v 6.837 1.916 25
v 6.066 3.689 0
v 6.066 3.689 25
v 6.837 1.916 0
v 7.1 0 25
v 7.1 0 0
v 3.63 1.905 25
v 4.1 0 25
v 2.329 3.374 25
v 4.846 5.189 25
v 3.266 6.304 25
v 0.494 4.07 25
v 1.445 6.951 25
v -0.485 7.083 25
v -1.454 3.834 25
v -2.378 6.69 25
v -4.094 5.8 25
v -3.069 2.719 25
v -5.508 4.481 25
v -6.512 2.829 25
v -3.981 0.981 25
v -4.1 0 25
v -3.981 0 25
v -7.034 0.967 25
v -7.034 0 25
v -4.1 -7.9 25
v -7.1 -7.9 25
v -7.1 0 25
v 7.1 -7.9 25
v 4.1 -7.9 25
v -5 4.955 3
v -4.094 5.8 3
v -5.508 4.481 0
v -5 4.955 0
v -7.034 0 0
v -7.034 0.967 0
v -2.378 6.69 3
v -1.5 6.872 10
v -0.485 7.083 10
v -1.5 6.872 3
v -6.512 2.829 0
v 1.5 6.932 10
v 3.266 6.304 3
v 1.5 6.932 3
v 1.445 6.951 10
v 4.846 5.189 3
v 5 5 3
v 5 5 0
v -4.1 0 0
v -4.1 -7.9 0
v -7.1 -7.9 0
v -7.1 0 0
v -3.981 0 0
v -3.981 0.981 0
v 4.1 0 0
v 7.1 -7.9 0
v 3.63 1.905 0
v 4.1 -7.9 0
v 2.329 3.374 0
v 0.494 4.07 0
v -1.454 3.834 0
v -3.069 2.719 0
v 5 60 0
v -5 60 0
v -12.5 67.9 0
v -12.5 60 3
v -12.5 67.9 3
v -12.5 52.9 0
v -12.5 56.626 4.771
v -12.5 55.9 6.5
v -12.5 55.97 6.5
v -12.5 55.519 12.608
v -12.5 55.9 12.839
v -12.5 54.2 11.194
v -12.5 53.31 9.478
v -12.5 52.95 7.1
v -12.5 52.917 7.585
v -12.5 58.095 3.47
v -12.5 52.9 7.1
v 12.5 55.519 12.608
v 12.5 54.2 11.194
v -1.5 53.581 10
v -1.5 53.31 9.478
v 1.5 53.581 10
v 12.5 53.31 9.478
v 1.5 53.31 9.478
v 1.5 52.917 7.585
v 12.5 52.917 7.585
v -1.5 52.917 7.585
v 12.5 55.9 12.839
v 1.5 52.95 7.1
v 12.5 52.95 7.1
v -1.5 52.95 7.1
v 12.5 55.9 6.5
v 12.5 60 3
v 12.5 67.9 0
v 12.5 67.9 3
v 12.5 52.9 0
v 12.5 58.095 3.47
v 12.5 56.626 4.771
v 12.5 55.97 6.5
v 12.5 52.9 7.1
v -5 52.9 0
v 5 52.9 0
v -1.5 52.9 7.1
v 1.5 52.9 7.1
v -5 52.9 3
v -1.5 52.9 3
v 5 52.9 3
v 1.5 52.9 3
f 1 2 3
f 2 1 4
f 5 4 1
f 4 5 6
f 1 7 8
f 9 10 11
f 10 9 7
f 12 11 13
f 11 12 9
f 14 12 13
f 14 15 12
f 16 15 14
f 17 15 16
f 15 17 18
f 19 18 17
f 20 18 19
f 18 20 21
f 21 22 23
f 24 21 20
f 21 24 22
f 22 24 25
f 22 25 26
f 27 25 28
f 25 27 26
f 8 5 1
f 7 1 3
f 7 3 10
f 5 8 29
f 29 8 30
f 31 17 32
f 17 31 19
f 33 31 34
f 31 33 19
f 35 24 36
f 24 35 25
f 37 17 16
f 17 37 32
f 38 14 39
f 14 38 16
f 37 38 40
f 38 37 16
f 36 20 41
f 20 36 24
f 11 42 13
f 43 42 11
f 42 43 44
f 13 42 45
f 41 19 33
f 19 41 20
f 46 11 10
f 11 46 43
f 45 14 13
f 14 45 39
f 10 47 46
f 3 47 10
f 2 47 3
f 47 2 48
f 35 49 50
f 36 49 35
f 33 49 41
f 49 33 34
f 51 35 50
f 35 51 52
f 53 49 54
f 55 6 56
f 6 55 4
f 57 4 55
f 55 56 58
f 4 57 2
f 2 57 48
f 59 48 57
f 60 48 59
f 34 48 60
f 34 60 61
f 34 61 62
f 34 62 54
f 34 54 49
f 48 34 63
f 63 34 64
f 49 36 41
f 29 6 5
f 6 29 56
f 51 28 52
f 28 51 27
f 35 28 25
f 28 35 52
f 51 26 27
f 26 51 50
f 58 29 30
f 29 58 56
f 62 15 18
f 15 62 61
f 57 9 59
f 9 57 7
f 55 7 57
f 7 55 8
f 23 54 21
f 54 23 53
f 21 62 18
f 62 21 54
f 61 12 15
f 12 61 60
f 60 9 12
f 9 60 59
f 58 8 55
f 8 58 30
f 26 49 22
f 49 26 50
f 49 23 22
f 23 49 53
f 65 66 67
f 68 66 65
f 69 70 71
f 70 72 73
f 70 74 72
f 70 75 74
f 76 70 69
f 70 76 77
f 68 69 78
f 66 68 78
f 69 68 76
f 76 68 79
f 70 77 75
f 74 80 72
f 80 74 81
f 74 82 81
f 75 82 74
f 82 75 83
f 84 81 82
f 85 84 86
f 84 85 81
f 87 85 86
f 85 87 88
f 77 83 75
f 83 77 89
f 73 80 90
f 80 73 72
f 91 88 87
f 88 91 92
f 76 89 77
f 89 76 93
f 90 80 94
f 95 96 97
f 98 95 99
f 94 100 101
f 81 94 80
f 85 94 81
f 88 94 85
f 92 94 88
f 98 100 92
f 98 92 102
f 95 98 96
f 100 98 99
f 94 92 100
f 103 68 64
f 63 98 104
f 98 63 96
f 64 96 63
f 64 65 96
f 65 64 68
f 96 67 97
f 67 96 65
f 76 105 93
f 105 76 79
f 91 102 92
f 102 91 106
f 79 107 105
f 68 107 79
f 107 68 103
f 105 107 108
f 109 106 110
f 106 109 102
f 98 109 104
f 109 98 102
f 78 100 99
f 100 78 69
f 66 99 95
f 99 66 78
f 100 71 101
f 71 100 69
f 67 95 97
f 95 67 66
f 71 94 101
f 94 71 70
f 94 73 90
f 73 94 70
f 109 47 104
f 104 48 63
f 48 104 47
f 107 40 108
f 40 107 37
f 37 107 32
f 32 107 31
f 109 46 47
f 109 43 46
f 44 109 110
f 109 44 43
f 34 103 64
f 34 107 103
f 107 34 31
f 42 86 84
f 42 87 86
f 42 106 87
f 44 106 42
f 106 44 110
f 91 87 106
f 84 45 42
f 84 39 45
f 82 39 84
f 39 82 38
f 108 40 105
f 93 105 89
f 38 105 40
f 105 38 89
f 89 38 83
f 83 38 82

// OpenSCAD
// Customizable X-axis leveling tool designed for Prusa i3 Berlin.  Used to
// make sure that each side of the X-axis is at the same height.  Necessary
// since there's a stepper motor on each side and they can get out of step.
//
// To use:
// Place "forked" end of tool on Y smooth rod and use Z control to bring the X axis
// just above the flat part of the top of the tool.  Manually rotate the Z rod
// for that side so the X smooth rod just touches the bottom of the "L" at the top
// of the tool.  Adjust the other side the same way.  Go back and forth to each
// side a few times to get the X-axis rod level.
//
// IMPORTANT: Don't squish the tool between the rods by using the Z motor control -
// this could put pressure on the smooth rods and possibly bend them.  Doing the
// final adjustment by hand works best.
//
// Successfully printed using 0.2mm layer height, 1.0mm shell width and 30% infill
// density.  Square or triangular shapes might be more accurate than the curves
// that touch the smooth rods.  Happy to see a remix!

// Michael Ang
// http://michaelang.com
// 25.03.2014

// Copyright (C) 2014 Michael Ang
//
// This program is free software: you can redistribute it and/or modify
// it under the terms of the GNU General Public License as published by
// the Free Software Foundation, either version 3 of the License, or
// (at your option) any later version.
//
// This program is distributed in the hope that it will be useful,
// but WITHOUT ANY WARRANTY; without even the implied warranty of
// MERCHANTABILITY or FITNESS FOR A PARTICULAR PURPOSE.  See the
// GNU General Public License for more details.

// Additionally:
// This work by Michael Ang is licensed under a Creative Commons
// Attribution-ShareAlike 4.0 International License.

// Distance between centers of claws
z_distance = 60;

// Diameter of smooth rods, plus a little extra so the claw sits flat
rod_diameter = 8.2;

// How deep to make claws
claw_depth = 25;

// How tall to make claws
claw_height = 15;

// Thickness of walls
wall_thickness = 3;

// Width of T-beam
beam_width = 10;

// Height of T-beam
beam_height = 10;


module claw(inner_radius, height, depth, wall_thickness, with_entry = false) {
	total_width = (inner_radius + wall_thickness) * 2;

	difference() {
		// outer part
		union() {
			cylinder(r = inner_radius + wall_thickness, h = depth, center = true);
			translate([-total_width/2, -(height - inner_radius - wall_thickness), -depth/2]) cube([(inner_radius + wall_thickness) * 2, height - inner_radius - wall_thickness, depth]);
			if (with_entry) {
				translate([0,0,-depth/2]) cube([inner_radius + wall_thickness, inner_radius + wall_thickness, depth]);
			}
		}
		
		claw_inner(inner_radius, height, depth, wall_thickness, with_entry);
	}
}

module claw_inner(inner_radius, height, depth, wall_thickness, with_entry) {
	cut_overlap = 1;
	
	cube_cutout_height = height - inner_radius - wall_thickness + cut_overlap;
	entry_cutout_height = height - wall_thickness + cut_overlap;

	// inner part
	union() {
		cylinder(r = inner_radius, h = depth + cut_overlap, center = true);
		translate([-inner_radius, -cube_cutout_height, -(depth + cut_overlap)/2]) cube([inner_radius * 2, cube_cutout_height, depth + cut_overlap]);
		if (with_entry) {
			// Chop off part of claw so rod can enter from side
			translate([-(inner_radius+wall_thickness+cut_overlap/2), -entry_cutout_height + inner_radius, -(depth + cut_overlap)/2]) cube([inner_radius * 2, entry_cutout_height, depth + cut_overlap]);
		}
	}
}

module t_beam(length, width, height, thickness) {
	translate([-width/2, 0, 0]) cube([width, length, thickness]);
	translate([-thickness/2, 0, 0]) cube([thickness, length, height]);
}


module x_leveler(z_distance, rod_radius, claw_depth, claw_height, wall_thickness, beam_width, beam_height) {
	translate([0, 0, claw_depth/2]) claw(rod_radius, claw_height, claw_depth, wall_thickness);
	translate([0, z_distance, rod_radius + wall_thickness]) rotate([180,90,0]) claw(rod_radius, claw_height, claw_depth, wall_thickness, with_entry = true);

	difference() {
		t_beam(z_distance, beam_width, beam_height, wall_thickness);
		translate([0, 0, claw_depth/2]) claw_inner(rod_radius, claw_height, claw_depth, wall_thickness);
		translate([0, z_distance, rod_radius + wall_thickness]) rotate([180,90,0]) claw_inner(rod_radius, claw_height, claw_depth, wall_thickness, with_entry = true);
	}
}

x_leveler(z_distance, rod_diameter / 2, claw_depth, claw_height, wall_thickness, beam_width, beam_height);
